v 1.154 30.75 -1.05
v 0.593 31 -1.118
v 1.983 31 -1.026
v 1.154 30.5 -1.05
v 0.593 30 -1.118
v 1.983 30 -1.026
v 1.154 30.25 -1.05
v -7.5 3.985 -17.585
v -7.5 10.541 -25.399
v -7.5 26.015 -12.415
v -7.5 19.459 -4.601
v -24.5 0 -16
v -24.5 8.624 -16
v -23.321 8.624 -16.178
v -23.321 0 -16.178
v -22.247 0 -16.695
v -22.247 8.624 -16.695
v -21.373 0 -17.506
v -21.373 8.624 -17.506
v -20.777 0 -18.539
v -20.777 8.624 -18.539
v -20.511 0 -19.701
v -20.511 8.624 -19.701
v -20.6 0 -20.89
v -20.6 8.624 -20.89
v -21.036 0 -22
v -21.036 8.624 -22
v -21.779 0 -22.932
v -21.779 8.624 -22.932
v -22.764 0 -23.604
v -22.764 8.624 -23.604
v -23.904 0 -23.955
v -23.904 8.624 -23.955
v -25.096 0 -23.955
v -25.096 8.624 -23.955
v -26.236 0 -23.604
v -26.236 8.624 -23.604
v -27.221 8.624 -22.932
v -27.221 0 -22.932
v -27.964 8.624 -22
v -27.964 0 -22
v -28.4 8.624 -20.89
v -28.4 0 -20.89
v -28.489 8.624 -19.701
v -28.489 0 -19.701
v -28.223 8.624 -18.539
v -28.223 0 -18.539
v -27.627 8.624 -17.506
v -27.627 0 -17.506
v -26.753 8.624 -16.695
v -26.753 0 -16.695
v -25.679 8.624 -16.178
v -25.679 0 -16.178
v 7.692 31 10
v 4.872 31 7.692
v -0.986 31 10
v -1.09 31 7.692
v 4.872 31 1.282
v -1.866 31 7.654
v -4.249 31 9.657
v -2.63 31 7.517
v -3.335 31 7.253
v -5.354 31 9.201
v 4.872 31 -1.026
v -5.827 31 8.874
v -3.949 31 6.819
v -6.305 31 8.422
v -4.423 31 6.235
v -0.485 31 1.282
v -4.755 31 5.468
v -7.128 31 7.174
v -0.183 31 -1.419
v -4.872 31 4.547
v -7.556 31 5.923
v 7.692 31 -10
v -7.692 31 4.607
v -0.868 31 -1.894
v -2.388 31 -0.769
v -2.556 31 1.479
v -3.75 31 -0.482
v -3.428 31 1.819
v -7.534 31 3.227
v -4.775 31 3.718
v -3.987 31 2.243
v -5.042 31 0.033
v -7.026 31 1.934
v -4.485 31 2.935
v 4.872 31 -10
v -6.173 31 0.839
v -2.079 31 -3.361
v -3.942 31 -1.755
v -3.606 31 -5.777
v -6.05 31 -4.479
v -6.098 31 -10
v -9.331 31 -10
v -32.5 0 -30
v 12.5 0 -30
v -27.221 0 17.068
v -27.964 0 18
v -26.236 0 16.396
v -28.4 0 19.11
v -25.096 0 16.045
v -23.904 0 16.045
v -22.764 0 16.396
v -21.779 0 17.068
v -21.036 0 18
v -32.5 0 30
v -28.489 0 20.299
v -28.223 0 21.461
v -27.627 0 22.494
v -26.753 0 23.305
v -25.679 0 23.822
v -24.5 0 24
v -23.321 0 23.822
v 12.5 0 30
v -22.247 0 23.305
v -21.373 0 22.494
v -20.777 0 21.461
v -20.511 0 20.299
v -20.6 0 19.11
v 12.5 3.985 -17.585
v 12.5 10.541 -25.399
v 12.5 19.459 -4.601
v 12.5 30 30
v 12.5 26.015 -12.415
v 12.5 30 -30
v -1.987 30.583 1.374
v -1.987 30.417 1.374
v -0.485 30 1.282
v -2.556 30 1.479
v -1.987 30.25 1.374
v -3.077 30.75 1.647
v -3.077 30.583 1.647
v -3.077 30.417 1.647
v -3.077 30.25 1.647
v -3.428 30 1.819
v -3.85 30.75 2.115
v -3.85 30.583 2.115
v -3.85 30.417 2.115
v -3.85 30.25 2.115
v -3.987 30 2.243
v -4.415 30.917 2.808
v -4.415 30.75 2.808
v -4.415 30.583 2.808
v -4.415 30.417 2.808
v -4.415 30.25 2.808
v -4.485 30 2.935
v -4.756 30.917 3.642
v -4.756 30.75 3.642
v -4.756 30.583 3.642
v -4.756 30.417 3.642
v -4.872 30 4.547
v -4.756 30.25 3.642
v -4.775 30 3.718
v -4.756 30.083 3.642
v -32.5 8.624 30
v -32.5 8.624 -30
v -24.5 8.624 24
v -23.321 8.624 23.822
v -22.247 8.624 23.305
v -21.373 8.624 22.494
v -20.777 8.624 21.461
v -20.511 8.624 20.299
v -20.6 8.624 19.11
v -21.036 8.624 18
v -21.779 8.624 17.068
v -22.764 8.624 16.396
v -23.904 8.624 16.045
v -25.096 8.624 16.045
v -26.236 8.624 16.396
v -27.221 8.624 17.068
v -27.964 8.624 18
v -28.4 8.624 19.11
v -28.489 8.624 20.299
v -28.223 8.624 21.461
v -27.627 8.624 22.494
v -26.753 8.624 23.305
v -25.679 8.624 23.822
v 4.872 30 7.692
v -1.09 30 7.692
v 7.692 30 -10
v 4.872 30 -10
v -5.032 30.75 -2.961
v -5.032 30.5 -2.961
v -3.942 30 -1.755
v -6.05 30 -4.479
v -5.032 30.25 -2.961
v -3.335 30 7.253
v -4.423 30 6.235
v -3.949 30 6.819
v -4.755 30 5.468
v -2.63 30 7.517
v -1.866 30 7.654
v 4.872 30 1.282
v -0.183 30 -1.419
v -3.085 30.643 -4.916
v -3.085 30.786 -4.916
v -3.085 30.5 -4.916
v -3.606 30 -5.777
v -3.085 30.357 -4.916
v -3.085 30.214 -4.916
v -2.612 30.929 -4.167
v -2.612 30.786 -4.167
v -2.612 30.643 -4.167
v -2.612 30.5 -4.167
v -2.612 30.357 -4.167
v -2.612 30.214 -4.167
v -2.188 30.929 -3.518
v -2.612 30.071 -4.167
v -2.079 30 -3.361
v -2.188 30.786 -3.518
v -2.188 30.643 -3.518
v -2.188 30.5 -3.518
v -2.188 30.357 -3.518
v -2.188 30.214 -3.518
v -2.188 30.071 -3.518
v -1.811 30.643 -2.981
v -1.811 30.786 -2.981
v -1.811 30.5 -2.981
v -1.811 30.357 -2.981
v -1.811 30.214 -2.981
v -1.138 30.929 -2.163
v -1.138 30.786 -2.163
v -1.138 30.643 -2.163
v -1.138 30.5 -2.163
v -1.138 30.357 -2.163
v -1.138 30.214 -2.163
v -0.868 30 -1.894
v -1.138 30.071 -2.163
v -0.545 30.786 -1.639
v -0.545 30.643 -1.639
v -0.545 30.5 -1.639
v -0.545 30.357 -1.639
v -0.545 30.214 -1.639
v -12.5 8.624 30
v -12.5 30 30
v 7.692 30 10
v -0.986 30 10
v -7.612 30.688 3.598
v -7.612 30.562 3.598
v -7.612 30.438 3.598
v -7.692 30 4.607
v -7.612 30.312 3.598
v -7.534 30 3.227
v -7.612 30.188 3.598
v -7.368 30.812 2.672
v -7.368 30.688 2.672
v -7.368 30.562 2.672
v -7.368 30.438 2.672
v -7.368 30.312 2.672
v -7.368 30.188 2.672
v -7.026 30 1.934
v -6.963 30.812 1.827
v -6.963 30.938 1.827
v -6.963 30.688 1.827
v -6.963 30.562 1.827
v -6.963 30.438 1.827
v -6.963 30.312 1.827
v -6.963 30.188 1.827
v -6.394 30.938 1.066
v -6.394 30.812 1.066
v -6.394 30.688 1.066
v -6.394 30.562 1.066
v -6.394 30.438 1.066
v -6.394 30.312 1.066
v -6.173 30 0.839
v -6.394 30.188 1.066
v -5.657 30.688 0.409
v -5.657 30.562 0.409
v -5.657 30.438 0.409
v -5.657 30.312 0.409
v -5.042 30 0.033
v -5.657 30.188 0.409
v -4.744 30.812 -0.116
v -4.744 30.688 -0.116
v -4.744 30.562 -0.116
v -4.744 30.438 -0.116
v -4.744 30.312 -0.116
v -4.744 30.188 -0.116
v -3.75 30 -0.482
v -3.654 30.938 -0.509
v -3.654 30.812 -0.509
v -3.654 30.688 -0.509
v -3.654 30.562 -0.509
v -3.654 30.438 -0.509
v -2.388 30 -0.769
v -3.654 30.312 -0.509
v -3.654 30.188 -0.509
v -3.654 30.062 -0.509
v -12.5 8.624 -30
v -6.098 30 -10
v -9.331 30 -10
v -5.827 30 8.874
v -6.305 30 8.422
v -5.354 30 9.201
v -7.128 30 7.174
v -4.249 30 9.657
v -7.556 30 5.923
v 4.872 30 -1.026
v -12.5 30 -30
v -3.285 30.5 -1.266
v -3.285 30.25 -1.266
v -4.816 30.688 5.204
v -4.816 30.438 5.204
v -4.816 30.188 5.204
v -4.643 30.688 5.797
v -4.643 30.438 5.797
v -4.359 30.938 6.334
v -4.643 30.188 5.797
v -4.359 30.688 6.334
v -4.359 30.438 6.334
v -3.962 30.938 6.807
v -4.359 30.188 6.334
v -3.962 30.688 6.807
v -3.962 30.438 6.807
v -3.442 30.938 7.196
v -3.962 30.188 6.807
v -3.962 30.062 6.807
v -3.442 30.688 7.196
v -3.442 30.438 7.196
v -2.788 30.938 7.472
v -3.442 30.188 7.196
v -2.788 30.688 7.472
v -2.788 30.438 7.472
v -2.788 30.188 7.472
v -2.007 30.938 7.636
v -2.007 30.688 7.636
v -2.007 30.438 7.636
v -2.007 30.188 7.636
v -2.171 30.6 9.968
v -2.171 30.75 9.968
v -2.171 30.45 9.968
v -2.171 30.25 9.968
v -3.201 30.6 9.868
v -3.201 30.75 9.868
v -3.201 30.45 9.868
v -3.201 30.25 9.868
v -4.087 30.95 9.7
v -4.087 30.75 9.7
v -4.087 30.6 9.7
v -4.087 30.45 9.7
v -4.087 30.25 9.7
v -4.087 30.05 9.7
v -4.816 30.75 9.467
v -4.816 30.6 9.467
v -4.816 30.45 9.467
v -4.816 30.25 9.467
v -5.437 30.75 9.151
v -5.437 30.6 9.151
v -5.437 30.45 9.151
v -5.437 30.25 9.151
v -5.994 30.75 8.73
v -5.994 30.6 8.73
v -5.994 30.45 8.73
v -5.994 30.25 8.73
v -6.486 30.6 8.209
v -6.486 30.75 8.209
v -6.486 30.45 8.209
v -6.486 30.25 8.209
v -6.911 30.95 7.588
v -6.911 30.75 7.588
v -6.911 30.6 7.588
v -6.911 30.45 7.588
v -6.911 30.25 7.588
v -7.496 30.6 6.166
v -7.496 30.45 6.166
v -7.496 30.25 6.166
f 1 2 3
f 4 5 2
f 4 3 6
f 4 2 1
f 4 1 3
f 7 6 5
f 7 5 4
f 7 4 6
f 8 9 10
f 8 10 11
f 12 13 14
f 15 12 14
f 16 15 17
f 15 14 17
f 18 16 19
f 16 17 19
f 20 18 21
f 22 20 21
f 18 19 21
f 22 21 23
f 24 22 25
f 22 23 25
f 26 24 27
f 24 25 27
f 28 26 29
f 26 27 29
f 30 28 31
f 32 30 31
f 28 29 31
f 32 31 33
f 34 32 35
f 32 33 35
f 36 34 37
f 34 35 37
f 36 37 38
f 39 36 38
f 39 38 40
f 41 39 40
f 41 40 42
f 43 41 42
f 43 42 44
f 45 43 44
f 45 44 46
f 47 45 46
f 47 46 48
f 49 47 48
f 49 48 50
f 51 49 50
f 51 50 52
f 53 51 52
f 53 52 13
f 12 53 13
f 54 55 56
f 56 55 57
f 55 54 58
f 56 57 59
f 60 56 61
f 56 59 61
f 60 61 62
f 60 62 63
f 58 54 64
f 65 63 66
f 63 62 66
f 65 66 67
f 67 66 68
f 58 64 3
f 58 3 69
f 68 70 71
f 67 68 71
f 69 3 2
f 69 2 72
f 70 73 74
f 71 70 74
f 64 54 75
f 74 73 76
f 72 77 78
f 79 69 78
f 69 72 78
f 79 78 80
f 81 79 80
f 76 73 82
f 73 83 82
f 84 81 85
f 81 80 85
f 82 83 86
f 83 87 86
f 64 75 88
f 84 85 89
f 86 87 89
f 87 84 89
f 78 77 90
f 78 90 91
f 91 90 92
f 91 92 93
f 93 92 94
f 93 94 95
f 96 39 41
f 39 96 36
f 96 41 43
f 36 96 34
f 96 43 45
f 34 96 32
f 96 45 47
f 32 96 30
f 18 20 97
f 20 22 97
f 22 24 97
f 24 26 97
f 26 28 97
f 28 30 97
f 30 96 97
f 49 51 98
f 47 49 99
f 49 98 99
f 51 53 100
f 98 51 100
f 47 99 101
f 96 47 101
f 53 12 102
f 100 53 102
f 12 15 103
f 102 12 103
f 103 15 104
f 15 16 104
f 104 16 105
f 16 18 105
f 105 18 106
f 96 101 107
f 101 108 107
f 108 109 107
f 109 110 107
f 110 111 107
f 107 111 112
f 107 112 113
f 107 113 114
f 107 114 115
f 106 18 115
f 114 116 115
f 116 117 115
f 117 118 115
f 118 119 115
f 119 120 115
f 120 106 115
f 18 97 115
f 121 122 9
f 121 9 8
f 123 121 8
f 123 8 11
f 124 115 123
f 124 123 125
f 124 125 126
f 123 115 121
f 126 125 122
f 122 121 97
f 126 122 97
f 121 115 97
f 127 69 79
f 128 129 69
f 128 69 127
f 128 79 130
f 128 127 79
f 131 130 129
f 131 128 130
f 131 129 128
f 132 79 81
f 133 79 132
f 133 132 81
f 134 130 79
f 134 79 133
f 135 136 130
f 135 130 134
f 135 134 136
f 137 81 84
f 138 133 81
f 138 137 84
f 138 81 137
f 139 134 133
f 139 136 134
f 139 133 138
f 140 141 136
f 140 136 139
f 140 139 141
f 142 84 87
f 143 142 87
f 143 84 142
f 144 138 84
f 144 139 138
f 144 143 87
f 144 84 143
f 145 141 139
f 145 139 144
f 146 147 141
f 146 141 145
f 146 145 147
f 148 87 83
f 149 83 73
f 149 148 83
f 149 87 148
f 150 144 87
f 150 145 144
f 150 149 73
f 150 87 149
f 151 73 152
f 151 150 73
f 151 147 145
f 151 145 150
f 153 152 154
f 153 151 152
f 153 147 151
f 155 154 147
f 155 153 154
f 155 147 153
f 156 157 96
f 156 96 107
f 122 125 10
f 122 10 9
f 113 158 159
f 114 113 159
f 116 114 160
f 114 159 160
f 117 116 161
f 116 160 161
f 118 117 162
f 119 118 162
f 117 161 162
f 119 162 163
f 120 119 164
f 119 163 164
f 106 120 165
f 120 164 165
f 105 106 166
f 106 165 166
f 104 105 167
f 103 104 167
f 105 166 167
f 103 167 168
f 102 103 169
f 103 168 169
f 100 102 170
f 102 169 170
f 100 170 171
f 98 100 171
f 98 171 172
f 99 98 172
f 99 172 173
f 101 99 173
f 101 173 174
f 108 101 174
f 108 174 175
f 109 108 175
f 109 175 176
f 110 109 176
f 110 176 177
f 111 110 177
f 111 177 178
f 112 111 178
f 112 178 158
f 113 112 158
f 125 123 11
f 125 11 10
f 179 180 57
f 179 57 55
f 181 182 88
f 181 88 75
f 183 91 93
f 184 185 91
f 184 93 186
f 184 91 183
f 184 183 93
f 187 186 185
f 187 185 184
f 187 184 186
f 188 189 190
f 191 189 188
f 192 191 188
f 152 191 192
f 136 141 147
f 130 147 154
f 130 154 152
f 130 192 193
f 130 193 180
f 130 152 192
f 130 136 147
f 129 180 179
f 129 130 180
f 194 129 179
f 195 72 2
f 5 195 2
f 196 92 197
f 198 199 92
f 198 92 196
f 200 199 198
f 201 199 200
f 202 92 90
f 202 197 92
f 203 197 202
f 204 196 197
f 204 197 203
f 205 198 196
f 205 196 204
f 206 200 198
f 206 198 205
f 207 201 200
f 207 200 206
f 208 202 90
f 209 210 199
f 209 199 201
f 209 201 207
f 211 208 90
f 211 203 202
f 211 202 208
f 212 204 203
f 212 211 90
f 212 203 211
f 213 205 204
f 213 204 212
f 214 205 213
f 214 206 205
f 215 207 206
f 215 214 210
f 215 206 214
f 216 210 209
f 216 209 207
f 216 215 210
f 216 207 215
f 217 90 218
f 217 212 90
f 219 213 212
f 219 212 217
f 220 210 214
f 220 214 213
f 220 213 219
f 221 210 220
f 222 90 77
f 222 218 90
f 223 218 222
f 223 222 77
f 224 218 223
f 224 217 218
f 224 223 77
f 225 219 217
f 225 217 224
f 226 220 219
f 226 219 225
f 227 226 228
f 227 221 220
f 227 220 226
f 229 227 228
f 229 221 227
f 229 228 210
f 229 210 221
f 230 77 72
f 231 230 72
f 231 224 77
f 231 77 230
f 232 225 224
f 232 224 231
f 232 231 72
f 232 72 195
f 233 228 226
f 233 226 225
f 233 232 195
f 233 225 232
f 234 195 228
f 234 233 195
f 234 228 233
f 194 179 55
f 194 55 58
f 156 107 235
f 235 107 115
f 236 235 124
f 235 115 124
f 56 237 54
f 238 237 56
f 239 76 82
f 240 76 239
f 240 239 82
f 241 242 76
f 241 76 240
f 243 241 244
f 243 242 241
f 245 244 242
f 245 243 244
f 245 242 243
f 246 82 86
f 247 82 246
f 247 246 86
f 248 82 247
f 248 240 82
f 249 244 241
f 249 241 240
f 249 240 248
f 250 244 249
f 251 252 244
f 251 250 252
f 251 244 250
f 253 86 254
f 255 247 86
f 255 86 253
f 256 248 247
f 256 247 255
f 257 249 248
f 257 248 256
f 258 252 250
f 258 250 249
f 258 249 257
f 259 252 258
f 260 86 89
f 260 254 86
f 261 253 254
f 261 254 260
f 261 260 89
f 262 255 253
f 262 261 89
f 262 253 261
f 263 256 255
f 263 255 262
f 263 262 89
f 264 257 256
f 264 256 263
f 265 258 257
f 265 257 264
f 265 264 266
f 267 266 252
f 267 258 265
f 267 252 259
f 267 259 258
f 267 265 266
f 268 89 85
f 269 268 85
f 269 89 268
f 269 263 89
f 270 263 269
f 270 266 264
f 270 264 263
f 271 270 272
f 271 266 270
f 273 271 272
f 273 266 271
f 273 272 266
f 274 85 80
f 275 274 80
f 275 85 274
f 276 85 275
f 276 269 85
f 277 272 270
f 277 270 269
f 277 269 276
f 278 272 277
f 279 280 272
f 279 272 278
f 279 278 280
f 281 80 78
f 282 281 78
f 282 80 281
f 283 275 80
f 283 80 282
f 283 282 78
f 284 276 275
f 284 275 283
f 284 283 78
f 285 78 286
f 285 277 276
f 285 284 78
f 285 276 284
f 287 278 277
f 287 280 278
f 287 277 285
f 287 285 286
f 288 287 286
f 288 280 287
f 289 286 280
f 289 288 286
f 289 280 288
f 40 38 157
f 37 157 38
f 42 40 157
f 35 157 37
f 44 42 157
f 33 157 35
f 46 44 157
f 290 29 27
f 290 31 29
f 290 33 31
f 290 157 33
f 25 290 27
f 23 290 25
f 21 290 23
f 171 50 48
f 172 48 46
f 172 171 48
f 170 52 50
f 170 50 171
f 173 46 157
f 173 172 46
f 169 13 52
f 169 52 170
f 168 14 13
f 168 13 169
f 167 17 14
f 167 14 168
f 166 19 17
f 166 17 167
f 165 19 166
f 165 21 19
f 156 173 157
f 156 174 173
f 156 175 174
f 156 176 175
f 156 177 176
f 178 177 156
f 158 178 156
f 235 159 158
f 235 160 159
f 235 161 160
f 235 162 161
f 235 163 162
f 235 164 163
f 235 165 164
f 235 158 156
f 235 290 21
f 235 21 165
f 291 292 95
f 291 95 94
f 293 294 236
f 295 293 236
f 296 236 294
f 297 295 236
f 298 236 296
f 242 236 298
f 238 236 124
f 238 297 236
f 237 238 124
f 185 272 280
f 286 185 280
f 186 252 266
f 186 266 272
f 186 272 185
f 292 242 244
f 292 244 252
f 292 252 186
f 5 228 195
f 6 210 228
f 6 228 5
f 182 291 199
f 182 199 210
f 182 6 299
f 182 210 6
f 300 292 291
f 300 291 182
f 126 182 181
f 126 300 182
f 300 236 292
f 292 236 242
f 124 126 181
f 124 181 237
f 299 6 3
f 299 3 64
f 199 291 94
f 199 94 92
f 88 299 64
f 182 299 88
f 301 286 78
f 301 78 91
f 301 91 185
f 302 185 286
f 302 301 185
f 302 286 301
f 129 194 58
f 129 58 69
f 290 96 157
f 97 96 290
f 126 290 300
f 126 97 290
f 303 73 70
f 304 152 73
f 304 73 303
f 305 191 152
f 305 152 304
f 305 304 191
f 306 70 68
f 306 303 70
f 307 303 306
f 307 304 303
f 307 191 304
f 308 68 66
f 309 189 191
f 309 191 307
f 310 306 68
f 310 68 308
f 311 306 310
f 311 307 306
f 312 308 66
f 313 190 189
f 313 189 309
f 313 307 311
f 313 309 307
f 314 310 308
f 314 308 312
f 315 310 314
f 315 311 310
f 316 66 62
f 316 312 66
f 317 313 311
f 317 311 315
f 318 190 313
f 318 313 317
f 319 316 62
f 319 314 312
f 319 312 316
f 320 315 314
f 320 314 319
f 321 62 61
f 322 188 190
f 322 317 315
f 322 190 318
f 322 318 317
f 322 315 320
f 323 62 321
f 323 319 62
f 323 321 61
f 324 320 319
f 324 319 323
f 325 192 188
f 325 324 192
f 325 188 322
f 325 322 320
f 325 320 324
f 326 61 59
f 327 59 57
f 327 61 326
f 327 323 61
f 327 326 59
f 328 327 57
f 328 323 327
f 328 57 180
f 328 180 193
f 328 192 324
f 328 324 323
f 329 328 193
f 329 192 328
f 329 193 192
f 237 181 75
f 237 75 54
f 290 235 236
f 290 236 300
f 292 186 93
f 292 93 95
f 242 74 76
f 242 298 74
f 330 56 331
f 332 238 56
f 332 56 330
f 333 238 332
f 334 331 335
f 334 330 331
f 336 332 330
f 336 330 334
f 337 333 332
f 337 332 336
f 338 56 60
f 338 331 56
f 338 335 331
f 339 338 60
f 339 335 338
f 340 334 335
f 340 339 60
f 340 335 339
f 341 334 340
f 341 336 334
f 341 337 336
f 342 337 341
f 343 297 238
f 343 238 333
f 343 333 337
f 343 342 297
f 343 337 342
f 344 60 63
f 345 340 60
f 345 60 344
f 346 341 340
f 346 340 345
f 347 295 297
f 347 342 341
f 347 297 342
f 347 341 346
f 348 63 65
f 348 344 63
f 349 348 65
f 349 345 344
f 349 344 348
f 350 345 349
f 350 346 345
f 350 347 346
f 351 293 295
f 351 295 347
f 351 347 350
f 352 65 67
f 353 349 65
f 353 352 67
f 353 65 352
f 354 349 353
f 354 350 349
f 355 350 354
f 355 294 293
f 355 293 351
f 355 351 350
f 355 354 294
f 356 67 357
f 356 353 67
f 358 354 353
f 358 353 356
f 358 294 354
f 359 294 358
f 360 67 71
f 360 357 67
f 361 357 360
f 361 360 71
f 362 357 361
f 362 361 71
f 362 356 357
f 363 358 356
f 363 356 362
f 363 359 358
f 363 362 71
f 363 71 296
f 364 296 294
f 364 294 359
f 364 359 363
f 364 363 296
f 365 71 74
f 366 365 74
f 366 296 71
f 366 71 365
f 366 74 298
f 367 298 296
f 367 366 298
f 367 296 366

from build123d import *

# Parameters (mm, degrees)
SKETCH1_W           = 25
SKETCH1_H           = 60
BOSS_EXTRUDE1_DEPTH = 30
SKETCH2_W           = 60
SKETCH2_H           = 8.623813306
BOSS_EXTRUDE2_DEPTH = 20
SKETCH3_R           = 4
CUT_EXTRUDE1_DEPTH  = 9.623813306
CUT_EXTRUDE2_DEPTH  = 20
BOSS_EXTRUDE3_DEPTH = 1


with BuildPart() as part:
    # Sketch1 → Boss-Extrude1 (new body)
    with BuildSketch(Plane(origin=(0, 0, 0), x_dir=(1, 0, 0), z_dir=(0, 1, 0))):
        Rectangle(SKETCH1_W, SKETCH1_H)
    extrude(amount=BOSS_EXTRUDE1_DEPTH)

    # Sketch2 → Boss-Extrude2 (add)
    with BuildSketch(Plane.ZY.offset(12.5)):
        with Locations((0, 4.311906653)):
            Rectangle(SKETCH2_W, SKETCH2_H)
    extrude(amount=BOSS_EXTRUDE2_DEPTH)

    # Sketch3 → Cut-Extrude1 (cut, through all)
    with BuildSketch(Plane(origin=(0, 8.623813306, 0), x_dir=(1, 0, 0), z_dir=(0, 1, 0))):
        with Locations(Location((-24.5, 20, 0), (0, 0, 270))):  # turned: the seam where the file's is
            Circle(SKETCH3_R)
        with Locations(Location((-24.5, -20, 0), (0, 0, 270))):  # turned: the seam where the file's is
            Circle(SKETCH3_R)
    extrude(amount=-CUT_EXTRUDE1_DEPTH, mode=Mode.SUBTRACT)

    # Sketch4 → Cut-Extrude2 (cut)
    with BuildSketch(Plane(origin=(12.5, 0, 0), x_dir=(0, 0, -1), z_dir=(1, 0, 0))):
        Polygon((12.414671802, 26.015265685), (25.398981518, 10.541167934), (17.585328198, 3.984734315), (4.601018482, 19.458832066), align=None)
    extrude(amount=-CUT_EXTRUDE2_DEPTH, mode=Mode.SUBTRACT)

    # Sketch5 → Boss-Extrude3 (add)
    with BuildSketch(Plane(origin=(0, 30, 0), x_dir=(1, 0, 0), z_dir=(0, 1, 0))):
        with BuildLine():
            Line((7.692307692, 10), (7.692307692, -10))
            Line((7.692307692, -10), (-0.985576923, -10))
            add(Edge.make_bspline(
                [(-0.985576923, -10), (-1.189915508, -9.998406517), (-1.585388921, -9.995322517), (-2.158891161, -9.97328499), (-2.692933181, -9.926466249), (-3.190880742, -9.87417544), (-3.651881782, -9.796967041), (-4.076156001, -9.706387661), (-4.462076213, -9.599333368), (-4.812578849, -9.472790754), (-5.13779529, -9.329673653), (-5.439160579, -9.1529927), (-5.729614752, -8.959721513), (-5.997579665, -8.730765608), (-6.255124362, -8.484777239), (-6.491466209, -8.20944831), (-6.713599726, -7.911670049), (-6.98368474, -7.480457665), (-7.26734754, -6.902448182), (-7.511671117, -6.168093018), (-7.667028651, -5.399134972), (-7.683798939, -4.873873893), (-7.692307692, -4.607371795)],
                knots=[0, 0, 0, 0, 1.242075696, 2.40389213, 3.487198984, 4.500157661, 5.446319301, 6.326791195, 7.136300648, 7.878370406, 8.590488565, 9.292260633, 9.999224673, 10.708050372, 11.431369221, 12.162165018, 12.910600795, 13.687589445, 15.252257874, 16.810406251, 18.381693487, 20, 20, 20, 20], degree=3))
            add(Edge.make_bspline(
                [(-7.692307692, -4.607371795), (-7.688394011, -4.436288612), (-7.680664221, -4.098387595), (-7.621454116, -3.601582104), (-7.51431592, -3.126906532), (-7.376939813, -2.670193942), (-7.1888858, -2.237951011), (-6.971132957, -1.821215885), (-6.700987613, -1.431932834), (-6.399355855, -1.057091635), (-6.048612719, -0.71360816), (-5.658467411, -0.39614679), (-5.217190586, -0.123711561), (-4.739255324, 0.129469087), (-4.212344466, 0.337396306), (-3.644404331, 0.520482963), (-3.031039376, 0.661647942), (-2.605906991, 0.732754289), (-2.387820513, 0.769230769)],
                knots=[0, 0, 0, 0, 0.982645791, 1.940792824, 2.867691729, 3.775150443, 4.675643875, 5.571354211, 6.471357401, 7.392684514, 8.331098131, 9.285922955, 10.275520706, 11.304845665, 12.388884831, 13.524255008, 14.729980297, 16, 16, 16, 16], degree=3))
            add(Edge.make_bspline(
                [(-2.387820513, 0.769230769), (-2.549345996, 0.849743746), (-2.855664626, 1.002429402), (-3.272498706, 1.255059029), (-3.637663897, 1.492888205), (-3.845092801, 1.671226556), (-3.942307692, 1.754807692)],
                knots=[0, 0, 0, 0, 1.172551213, 2.223638478, 3.167479604, 4, 4, 4, 4], degree=3))
            add(Edge.make_bspline(
                [(-3.942307692, 1.754807692), (-4.131560958, 1.939760877), (-4.519688241, 2.319069404), (-5.049338611, 2.971134565), (-5.573421338, 3.688219618), (-5.888069662, 4.2107727), (-6.049679487, 4.479166667)],
                knots=[0, 0, 0, 0, 0.918170575, 1.883016652, 2.912673989, 4, 4, 4, 4], degree=3))
            Line((-6.049679487, 4.479166667), (-9.330929487, 10))
            Line((-9.330929487, 10), (-6.09775641, 10))
            Line((-6.09775641, 10), (-3.605769231, 5.77724359))
            add(Edge.make_bspline(
                [(-3.605769231, 5.77724359), (-3.516164402, 5.629086783), (-3.342524957, 5.34198322), (-3.091798881, 4.922621923), (-2.845639404, 4.536751784), (-2.618440056, 4.172360633), (-2.395792195, 3.839058208), (-2.196203285, 3.524230537), (-1.99576396, 3.245712753), (-1.765615132, 2.91110533), (-1.484546035, 2.549334189), (-1.156558274, 2.177690005), (-0.854995349, 1.869836465), (-0.473923576, 1.576103263), (-8.0808e-05, 1.307161834), (0.399436219, 1.179583217), (0.592948718, 1.117788462)],
                knots=[0, 0, 0, 0, 1.130591283, 2.190900266, 3.190104209, 4.119071823, 4.994606968, 5.807262858, 6.55236009, 7.234593472, 8.459046683, 9.540234366, 10.471327768, 11.266723835, 12.676093724, 14, 14, 14, 14], degree=3))
            add(Edge.make_bspline(
                [(0.592948718, 1.117788462), (0.674242958, 1.103128347), (0.859840146, 1.069658866), (1.174983707, 1.047799895), (1.556818794, 1.024599522), (1.833541189, 1.025275503), (1.983173077, 1.025641026)],
                knots=[0, 0, 0, 0, 0.709978628, 1.620902492, 2.713552433, 4, 4, 4, 4], degree=3))
            Line((1.983173077, 1.025641026), (4.871794872, 1.025641026))
            Line((4.871794872, 1.025641026), (4.871794872, 10))
            Line((4.871794872, 10), (7.692307692, 10))
        make_face()
        with BuildLine():
            Line((4.871794872, -1.282051282), (-0.484775641, -1.282051282))
            add(Edge.make_bspline(
                [(-0.484775641, -1.282051282), (-0.753386517, -1.286217416), (-1.255529355, -1.294005613), (-1.957518176, -1.361528247), (-2.558000395, -1.467075801), (-3.064646298, -1.627384754), (-3.490432782, -1.842070076), (-3.859462924, -2.104609449), (-4.169752828, -2.430321342), (-4.424939479, -2.80379836), (-4.624425797, -3.210810832), (-4.763816724, -3.641583566), (-4.857398907, -4.087856282), (-4.866967535, -4.393220511), (-4.871794872, -4.547275641)],
                knots=[0, 0, 0, 0, 1.546056516, 2.890207646, 4.055830773, 5.050253158, 5.937355789, 6.790906573, 7.644595853, 8.512568064, 9.38593768, 10.244184789, 11.114197691, 12, 12, 12, 12], degree=3))
            add(Edge.make_bspline(
                [(-4.871794872, -4.547275641), (-4.868088958, -4.659544766), (-4.86083016, -4.879447), (-4.822372143, -5.202097101), (-4.749202425, -5.50786025), (-4.648165007, -5.798940542), (-4.520236894, -6.075969951), (-4.363033481, -6.337858904), (-4.177365929, -6.583269781), (-3.964383478, -6.81341075), (-3.719926868, -7.02284832), (-3.440676061, -7.203538998), (-3.128860999, -7.357089463), (-2.784111469, -7.478956731), (-2.407515729, -7.576430897), (-1.996929252, -7.641277267), (-1.554229928, -7.688199899), (-1.24746496, -7.690912847), (-1.08974359, -7.692307692)],
                knots=[0, 0, 0, 0, 0.965235723, 1.89061323, 2.787065514, 3.661873922, 4.534873316, 5.404925039, 6.281839248, 7.175200054, 8.095223355, 9.040740021, 10.02630299, 11.075573487, 12.177989335, 13.364883635, 14.645170704, 16, 16, 16, 16], degree=3))
            Line((-1.08974359, -7.692307692), (4.871794872, -7.692307692))
            Line((4.871794872, -7.692307692), (4.871794872, -1.282051282))
        make_face(mode=Mode.SUBTRACT)
    extrude(amount=BOSS_EXTRUDE3_DEPTH)


solid = part.part
